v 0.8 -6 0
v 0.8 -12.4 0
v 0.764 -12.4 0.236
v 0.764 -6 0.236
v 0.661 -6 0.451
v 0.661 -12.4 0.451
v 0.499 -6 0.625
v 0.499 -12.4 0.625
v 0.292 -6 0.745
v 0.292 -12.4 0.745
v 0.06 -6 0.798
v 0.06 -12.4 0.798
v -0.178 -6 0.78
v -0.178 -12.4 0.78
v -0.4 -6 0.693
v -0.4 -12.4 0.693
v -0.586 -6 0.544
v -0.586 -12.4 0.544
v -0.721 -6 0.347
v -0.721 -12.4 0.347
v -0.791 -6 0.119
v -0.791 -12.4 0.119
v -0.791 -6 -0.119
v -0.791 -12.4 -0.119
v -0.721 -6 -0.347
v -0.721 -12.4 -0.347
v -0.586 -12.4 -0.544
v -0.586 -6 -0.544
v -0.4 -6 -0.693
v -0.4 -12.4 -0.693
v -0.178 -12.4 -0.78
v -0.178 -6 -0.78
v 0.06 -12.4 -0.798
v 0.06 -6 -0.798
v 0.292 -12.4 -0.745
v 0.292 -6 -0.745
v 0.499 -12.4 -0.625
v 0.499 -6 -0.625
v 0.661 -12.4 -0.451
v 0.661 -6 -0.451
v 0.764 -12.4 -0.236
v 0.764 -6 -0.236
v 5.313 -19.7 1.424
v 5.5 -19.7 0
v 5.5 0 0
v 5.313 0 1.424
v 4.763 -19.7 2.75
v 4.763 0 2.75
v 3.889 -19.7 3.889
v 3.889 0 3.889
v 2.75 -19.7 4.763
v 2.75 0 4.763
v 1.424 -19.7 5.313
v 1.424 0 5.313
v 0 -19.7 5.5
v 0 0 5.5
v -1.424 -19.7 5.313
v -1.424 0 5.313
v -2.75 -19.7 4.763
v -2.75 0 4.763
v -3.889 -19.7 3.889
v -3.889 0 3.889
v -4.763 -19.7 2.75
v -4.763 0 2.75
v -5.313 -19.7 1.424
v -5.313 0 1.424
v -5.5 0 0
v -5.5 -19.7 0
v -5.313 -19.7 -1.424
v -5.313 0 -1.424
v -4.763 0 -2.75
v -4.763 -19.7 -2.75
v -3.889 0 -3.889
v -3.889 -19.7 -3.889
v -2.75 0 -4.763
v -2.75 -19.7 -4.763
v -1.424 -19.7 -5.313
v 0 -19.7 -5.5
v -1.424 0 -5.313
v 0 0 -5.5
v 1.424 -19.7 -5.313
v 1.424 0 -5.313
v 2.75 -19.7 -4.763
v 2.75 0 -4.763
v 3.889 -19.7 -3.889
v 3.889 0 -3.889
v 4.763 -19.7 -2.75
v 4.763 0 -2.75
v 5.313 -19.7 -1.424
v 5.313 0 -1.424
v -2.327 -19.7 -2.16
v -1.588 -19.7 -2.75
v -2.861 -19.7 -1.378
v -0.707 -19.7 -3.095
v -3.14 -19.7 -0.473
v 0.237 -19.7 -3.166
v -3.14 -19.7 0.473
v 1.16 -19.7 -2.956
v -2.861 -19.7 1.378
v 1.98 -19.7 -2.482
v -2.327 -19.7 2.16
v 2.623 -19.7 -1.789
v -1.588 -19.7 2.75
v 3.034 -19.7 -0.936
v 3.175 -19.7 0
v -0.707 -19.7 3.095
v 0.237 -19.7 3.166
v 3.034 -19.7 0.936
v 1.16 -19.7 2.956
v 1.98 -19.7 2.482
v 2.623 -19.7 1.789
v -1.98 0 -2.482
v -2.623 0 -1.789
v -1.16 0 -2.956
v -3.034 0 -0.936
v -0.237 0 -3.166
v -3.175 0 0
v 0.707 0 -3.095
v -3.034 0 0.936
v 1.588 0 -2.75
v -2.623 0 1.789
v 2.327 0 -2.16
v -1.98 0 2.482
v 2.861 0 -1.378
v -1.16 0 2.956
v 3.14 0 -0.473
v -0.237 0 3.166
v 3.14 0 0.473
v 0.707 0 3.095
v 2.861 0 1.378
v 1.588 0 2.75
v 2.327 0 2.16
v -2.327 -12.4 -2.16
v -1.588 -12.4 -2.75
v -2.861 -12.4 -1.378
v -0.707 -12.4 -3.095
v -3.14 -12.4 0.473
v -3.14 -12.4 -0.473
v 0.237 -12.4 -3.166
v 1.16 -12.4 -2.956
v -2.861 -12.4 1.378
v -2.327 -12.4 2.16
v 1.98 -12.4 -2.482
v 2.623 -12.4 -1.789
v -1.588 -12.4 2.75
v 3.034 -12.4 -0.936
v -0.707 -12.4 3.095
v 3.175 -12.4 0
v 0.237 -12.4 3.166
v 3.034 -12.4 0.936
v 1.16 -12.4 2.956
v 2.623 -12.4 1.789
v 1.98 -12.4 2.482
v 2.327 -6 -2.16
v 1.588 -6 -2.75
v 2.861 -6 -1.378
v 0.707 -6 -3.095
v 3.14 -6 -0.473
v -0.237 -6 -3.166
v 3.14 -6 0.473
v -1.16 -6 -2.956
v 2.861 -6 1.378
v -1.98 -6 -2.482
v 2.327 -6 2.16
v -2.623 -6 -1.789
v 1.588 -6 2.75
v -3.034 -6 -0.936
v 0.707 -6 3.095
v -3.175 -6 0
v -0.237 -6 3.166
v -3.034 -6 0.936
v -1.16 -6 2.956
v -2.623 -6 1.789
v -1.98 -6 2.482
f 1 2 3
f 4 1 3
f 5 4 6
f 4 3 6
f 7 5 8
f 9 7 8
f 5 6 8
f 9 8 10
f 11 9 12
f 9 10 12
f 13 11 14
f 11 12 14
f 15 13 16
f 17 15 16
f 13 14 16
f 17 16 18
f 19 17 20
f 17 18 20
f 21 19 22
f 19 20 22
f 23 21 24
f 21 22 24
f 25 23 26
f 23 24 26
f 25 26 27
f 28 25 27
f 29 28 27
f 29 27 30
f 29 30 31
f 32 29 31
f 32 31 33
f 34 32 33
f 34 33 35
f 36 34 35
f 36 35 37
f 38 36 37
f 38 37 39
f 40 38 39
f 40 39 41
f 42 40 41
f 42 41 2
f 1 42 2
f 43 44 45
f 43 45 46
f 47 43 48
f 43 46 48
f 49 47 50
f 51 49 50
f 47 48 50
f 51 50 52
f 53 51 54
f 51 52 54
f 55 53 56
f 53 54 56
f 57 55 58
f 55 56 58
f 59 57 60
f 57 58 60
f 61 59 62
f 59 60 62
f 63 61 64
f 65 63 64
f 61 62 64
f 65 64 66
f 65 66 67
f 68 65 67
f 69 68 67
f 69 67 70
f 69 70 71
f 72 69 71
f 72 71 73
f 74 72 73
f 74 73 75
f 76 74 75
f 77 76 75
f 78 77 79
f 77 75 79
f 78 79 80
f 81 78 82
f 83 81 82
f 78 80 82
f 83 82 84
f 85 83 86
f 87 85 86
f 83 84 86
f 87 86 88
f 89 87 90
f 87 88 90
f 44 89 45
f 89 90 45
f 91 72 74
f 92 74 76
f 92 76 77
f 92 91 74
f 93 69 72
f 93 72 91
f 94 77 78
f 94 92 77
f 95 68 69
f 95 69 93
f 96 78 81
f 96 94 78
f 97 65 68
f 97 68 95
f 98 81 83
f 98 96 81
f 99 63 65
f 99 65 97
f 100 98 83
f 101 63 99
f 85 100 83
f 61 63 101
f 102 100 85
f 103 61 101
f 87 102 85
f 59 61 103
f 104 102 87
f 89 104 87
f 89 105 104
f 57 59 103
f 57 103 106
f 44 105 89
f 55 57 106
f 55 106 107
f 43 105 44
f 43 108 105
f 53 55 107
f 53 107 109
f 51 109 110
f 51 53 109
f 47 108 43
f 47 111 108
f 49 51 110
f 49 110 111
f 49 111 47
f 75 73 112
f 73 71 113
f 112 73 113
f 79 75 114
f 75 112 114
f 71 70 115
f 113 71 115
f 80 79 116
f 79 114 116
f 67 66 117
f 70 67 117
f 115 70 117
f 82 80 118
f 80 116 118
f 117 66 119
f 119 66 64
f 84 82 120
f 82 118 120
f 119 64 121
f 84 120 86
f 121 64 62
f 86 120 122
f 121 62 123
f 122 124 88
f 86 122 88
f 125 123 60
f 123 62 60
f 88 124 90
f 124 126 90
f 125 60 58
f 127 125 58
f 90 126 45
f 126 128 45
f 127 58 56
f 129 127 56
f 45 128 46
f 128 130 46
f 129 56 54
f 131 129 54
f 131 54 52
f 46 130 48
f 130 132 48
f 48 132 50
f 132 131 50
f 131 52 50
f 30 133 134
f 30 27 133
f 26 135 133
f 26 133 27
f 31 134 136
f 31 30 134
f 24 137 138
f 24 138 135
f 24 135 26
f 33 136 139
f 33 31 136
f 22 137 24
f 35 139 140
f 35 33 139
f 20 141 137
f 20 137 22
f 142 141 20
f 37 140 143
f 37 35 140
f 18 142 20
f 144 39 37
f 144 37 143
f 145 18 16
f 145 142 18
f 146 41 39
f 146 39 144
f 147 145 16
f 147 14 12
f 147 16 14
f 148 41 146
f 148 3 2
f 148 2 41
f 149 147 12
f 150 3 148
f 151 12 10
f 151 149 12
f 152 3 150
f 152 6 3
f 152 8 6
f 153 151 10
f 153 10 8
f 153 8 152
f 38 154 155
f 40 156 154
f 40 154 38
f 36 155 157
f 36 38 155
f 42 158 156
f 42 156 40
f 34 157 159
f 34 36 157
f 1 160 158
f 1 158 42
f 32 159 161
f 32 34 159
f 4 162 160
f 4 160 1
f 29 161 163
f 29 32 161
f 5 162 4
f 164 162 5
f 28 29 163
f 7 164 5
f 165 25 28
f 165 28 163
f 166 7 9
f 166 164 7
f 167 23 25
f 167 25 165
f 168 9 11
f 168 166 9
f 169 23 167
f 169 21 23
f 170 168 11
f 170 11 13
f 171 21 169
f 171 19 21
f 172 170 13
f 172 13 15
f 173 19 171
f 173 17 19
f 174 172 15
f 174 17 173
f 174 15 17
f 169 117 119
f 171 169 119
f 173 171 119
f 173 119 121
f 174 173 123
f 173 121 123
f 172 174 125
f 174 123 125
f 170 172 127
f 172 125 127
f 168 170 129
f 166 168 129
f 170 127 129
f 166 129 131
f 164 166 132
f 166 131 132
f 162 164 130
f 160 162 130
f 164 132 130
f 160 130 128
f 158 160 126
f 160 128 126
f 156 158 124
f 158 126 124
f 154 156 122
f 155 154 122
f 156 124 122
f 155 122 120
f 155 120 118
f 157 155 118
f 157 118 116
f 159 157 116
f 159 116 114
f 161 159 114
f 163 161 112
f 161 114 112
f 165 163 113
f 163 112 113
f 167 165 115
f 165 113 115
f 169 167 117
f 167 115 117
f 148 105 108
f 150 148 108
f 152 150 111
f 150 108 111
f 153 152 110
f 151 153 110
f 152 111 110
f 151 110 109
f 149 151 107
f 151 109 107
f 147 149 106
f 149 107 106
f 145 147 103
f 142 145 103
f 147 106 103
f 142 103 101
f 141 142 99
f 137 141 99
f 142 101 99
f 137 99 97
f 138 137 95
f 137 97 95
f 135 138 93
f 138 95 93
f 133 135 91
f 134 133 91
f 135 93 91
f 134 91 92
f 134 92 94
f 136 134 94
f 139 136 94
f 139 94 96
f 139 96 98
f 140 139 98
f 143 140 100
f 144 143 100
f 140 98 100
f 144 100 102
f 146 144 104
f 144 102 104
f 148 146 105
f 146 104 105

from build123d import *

# Parameters (mm, degrees)
F0_R     = 5.5
F1_DEPTH = 19.7
F2_R     = 3.175
F3_DEPTH = 7.3
F5_R     = 3.175
F6_DEPTH = 6
F4_R     = 0.8
F7_DEPTH = 12.401


with BuildPart() as f1:
    # F0 (on Front) → F1 (new body)
    with BuildSketch(Plane.XZ):
        Circle(F0_R)
    extrude(amount=F1_DEPTH)

    # F2 (on face) → F3 (cut)
    with BuildSketch(Plane.XZ.offset(19.7)):
        Circle(F2_R)
    extrude(amount=-F3_DEPTH, mode=Mode.SUBTRACT)

    # F5 (on face) → F6 (cut)
    with BuildSketch(Plane(origin=(0, 0, 0), x_dir=(-1, 0, 0), z_dir=(0, 1, 0))):
        Circle(F5_R)
    extrude(amount=-F6_DEPTH, mode=Mode.SUBTRACT)

    # F4 (on face) → F7 (cut, through all)
    with BuildSketch(Plane.XZ.offset(12.4)):
        Circle(F4_R)
    extrude(amount=-F7_DEPTH, mode=Mode.SUBTRACT)


solid = f1.part
